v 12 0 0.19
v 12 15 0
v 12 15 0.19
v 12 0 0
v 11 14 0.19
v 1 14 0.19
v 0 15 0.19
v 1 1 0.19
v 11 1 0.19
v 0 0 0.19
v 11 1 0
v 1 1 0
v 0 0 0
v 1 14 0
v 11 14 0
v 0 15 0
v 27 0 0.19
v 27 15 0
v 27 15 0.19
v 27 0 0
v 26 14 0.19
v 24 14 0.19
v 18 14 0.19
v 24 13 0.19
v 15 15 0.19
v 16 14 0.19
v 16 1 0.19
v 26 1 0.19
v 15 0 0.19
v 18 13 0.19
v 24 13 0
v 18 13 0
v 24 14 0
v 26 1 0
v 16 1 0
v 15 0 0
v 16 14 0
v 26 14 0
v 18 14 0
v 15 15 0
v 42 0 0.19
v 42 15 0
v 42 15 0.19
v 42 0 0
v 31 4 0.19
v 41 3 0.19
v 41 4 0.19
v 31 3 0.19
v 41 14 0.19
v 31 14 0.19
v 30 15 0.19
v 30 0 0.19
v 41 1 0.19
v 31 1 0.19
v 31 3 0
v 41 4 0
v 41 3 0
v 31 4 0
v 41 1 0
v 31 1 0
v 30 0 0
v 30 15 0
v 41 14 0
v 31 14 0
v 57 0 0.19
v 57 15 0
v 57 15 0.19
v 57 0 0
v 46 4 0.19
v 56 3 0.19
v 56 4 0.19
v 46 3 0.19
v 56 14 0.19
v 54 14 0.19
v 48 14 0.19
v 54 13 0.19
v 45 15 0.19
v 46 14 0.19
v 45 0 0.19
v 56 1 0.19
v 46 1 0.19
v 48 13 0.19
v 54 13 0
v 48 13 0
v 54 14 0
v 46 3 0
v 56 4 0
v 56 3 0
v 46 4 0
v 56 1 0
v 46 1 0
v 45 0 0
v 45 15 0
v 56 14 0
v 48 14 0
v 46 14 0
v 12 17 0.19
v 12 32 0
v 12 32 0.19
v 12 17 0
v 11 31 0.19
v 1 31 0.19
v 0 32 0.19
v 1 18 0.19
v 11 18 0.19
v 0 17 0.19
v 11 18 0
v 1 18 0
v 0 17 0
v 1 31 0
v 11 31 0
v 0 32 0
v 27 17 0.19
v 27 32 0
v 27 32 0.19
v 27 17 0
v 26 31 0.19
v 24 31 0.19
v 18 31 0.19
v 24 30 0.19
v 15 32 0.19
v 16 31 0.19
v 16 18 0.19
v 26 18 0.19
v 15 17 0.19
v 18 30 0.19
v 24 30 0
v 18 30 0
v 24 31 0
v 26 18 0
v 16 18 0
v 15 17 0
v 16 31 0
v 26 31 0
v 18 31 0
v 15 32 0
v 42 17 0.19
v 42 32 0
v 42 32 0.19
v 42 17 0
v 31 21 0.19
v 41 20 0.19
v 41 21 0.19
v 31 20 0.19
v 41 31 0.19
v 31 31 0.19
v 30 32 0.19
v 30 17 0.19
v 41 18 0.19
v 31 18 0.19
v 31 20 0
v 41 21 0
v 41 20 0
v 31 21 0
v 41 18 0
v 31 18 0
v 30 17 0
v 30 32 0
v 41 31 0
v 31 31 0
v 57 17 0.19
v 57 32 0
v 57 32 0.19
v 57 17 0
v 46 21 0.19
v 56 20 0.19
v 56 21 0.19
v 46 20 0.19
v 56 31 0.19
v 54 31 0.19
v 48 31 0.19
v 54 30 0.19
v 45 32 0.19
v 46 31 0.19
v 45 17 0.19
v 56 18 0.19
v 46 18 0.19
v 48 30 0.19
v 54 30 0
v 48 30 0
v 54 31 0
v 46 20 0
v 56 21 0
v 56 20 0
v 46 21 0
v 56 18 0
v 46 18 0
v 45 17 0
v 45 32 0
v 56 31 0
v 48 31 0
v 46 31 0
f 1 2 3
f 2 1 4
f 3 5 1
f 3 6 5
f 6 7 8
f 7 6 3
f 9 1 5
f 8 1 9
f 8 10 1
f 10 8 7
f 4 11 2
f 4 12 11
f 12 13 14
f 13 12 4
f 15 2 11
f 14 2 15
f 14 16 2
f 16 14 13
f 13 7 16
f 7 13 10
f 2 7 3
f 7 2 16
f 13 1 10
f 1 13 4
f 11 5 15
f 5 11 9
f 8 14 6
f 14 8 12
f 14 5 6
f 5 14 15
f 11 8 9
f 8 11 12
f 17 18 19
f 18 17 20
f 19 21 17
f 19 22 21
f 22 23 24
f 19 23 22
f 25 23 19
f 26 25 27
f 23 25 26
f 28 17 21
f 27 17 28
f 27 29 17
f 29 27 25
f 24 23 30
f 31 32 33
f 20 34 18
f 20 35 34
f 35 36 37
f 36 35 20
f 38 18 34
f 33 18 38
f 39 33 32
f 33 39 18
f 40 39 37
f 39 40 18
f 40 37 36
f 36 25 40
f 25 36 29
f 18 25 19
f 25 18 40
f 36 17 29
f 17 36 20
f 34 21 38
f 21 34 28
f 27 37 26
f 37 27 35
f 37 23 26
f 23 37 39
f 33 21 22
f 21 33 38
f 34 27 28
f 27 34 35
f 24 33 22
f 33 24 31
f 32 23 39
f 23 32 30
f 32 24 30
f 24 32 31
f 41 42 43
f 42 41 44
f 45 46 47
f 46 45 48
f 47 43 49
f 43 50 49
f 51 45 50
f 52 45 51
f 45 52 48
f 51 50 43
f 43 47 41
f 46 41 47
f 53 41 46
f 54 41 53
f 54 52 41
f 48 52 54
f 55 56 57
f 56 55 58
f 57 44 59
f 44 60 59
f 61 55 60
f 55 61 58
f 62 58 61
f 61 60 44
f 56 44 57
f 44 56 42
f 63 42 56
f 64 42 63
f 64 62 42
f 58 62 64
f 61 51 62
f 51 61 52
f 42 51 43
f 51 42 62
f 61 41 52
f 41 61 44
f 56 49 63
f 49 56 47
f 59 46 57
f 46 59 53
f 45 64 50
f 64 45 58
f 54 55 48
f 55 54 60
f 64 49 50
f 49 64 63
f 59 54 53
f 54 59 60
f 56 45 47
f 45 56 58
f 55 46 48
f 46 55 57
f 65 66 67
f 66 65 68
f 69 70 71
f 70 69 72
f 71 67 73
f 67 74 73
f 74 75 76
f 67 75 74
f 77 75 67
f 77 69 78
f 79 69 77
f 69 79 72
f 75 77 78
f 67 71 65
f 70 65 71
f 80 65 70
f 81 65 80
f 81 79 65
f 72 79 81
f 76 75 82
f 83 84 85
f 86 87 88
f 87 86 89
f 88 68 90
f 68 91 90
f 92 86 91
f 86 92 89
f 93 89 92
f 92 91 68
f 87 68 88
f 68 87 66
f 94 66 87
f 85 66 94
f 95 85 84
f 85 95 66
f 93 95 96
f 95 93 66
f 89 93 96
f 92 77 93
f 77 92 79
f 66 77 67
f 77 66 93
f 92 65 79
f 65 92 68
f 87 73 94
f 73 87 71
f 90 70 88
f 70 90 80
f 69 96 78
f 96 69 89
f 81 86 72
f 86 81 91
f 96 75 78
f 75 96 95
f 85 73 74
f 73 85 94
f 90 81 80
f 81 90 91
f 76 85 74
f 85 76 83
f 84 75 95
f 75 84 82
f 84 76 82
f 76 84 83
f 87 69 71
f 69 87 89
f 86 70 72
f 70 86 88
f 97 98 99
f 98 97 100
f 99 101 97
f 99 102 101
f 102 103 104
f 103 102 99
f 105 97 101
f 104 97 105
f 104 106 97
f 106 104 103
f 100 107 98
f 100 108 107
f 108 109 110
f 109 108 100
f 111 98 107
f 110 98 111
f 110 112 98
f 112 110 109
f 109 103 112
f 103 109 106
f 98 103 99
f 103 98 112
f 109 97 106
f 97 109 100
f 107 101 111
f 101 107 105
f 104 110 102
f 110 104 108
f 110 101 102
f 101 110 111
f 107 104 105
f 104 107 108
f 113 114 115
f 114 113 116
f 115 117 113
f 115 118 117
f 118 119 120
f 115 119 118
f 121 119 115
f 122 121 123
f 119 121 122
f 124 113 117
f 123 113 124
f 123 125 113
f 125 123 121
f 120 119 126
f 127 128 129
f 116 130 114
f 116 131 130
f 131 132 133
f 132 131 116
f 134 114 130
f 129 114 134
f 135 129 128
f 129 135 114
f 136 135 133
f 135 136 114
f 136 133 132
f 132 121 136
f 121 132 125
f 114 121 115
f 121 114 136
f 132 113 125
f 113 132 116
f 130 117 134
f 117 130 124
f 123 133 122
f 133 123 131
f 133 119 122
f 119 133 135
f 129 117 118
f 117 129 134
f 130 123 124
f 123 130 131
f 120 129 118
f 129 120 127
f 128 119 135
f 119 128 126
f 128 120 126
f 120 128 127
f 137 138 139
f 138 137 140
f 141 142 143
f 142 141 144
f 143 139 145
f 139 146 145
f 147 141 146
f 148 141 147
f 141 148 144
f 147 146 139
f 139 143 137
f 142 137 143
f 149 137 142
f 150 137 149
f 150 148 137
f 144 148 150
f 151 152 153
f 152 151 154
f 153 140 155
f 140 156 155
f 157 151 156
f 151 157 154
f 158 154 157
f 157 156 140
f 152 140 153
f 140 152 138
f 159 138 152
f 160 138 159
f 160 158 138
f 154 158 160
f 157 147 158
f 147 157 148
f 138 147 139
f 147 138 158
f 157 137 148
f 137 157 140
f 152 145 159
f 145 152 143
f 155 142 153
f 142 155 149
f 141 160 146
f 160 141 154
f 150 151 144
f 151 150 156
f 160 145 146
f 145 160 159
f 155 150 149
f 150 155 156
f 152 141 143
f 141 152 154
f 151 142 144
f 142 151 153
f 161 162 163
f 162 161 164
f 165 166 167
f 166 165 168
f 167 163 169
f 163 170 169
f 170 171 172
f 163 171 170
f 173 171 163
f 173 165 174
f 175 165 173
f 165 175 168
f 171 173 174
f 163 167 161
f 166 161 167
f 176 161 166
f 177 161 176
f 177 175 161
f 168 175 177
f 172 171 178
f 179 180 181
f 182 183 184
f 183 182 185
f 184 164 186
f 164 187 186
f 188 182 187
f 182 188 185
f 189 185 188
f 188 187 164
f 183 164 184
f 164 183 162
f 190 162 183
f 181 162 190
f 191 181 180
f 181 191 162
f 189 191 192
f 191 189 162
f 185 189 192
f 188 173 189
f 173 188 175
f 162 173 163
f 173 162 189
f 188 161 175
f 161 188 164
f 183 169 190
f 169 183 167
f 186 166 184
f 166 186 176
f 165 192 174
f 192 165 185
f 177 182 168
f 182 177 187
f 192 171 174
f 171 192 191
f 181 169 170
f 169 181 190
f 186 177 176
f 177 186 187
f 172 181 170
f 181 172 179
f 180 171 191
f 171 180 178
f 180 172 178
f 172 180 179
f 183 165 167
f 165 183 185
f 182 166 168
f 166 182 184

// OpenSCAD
LIP_SIZE = 6; // mm size of lip
SEPARATOR_OFFSET = 3;

module gen_film(l, w, brim, thicc, lip, separator) {
    translate([(w/2 + brim)/2, l, 0])
    
    if (lip) // generates lip
        cube([LIP_SIZE, brim*2, thicc]);
    
    if (separator)
        translate([0, SEPARATOR_OFFSET, 0])
            cube([w + brim*2, brim, thicc]);
    
    difference() 
    {
        cube([brim*2 + w, brim*2 + l, thicc]);
        translate([brim, brim, -thicc/2]) 
            cube([w, l, thicc*2]);
    }
}

module gen_film_row(num, l, w, brim, thicc, lip, separator, supports) {
    for(i = [0 : num - 1]) {
        translate([i*(w + brim*2 + 2), 0, 0]) 
        {
            gen_film(l, w, brim, thicc, lip, separator);
            
            // generate connector supports - doesn't really slice well
            if (supports) {
                translate([w + brim*2, (l + brim*2)/4, 0]) cube([2, brim, thicc]);
                translate([w + brim*2, ((l + brim*2)/4)*3, 0]) cube([2, brim, thicc]);
            }
        }
    }
}

// gen_film_row(15, 13, 10, 1, 0.20, true, true, false);

// FIRST ROW

gen_film(13, 10, 1, 0.19, false, false);

translate([15,0,0])
    gen_film(13, 10, 1, 0.19, true, false);

translate([30,0,0])
    gen_film(13, 10, 1, 0.19, false, true);

translate([45,0,0])
    gen_film(13, 10, 1, 0.19, true, true);

// SECOND ROW

translate([0,17,0])
    gen_film(13, 10, 1, 0.19, false, false);

translate([15,17,0])
    gen_film(13, 10, 1, 0.19, true, false);

translate([30,17,0])
    gen_film(13, 10, 1, 0.19, false, true);

translate([45,17,0])
    gen_film(13, 10, 1, 0.19, true, true);
